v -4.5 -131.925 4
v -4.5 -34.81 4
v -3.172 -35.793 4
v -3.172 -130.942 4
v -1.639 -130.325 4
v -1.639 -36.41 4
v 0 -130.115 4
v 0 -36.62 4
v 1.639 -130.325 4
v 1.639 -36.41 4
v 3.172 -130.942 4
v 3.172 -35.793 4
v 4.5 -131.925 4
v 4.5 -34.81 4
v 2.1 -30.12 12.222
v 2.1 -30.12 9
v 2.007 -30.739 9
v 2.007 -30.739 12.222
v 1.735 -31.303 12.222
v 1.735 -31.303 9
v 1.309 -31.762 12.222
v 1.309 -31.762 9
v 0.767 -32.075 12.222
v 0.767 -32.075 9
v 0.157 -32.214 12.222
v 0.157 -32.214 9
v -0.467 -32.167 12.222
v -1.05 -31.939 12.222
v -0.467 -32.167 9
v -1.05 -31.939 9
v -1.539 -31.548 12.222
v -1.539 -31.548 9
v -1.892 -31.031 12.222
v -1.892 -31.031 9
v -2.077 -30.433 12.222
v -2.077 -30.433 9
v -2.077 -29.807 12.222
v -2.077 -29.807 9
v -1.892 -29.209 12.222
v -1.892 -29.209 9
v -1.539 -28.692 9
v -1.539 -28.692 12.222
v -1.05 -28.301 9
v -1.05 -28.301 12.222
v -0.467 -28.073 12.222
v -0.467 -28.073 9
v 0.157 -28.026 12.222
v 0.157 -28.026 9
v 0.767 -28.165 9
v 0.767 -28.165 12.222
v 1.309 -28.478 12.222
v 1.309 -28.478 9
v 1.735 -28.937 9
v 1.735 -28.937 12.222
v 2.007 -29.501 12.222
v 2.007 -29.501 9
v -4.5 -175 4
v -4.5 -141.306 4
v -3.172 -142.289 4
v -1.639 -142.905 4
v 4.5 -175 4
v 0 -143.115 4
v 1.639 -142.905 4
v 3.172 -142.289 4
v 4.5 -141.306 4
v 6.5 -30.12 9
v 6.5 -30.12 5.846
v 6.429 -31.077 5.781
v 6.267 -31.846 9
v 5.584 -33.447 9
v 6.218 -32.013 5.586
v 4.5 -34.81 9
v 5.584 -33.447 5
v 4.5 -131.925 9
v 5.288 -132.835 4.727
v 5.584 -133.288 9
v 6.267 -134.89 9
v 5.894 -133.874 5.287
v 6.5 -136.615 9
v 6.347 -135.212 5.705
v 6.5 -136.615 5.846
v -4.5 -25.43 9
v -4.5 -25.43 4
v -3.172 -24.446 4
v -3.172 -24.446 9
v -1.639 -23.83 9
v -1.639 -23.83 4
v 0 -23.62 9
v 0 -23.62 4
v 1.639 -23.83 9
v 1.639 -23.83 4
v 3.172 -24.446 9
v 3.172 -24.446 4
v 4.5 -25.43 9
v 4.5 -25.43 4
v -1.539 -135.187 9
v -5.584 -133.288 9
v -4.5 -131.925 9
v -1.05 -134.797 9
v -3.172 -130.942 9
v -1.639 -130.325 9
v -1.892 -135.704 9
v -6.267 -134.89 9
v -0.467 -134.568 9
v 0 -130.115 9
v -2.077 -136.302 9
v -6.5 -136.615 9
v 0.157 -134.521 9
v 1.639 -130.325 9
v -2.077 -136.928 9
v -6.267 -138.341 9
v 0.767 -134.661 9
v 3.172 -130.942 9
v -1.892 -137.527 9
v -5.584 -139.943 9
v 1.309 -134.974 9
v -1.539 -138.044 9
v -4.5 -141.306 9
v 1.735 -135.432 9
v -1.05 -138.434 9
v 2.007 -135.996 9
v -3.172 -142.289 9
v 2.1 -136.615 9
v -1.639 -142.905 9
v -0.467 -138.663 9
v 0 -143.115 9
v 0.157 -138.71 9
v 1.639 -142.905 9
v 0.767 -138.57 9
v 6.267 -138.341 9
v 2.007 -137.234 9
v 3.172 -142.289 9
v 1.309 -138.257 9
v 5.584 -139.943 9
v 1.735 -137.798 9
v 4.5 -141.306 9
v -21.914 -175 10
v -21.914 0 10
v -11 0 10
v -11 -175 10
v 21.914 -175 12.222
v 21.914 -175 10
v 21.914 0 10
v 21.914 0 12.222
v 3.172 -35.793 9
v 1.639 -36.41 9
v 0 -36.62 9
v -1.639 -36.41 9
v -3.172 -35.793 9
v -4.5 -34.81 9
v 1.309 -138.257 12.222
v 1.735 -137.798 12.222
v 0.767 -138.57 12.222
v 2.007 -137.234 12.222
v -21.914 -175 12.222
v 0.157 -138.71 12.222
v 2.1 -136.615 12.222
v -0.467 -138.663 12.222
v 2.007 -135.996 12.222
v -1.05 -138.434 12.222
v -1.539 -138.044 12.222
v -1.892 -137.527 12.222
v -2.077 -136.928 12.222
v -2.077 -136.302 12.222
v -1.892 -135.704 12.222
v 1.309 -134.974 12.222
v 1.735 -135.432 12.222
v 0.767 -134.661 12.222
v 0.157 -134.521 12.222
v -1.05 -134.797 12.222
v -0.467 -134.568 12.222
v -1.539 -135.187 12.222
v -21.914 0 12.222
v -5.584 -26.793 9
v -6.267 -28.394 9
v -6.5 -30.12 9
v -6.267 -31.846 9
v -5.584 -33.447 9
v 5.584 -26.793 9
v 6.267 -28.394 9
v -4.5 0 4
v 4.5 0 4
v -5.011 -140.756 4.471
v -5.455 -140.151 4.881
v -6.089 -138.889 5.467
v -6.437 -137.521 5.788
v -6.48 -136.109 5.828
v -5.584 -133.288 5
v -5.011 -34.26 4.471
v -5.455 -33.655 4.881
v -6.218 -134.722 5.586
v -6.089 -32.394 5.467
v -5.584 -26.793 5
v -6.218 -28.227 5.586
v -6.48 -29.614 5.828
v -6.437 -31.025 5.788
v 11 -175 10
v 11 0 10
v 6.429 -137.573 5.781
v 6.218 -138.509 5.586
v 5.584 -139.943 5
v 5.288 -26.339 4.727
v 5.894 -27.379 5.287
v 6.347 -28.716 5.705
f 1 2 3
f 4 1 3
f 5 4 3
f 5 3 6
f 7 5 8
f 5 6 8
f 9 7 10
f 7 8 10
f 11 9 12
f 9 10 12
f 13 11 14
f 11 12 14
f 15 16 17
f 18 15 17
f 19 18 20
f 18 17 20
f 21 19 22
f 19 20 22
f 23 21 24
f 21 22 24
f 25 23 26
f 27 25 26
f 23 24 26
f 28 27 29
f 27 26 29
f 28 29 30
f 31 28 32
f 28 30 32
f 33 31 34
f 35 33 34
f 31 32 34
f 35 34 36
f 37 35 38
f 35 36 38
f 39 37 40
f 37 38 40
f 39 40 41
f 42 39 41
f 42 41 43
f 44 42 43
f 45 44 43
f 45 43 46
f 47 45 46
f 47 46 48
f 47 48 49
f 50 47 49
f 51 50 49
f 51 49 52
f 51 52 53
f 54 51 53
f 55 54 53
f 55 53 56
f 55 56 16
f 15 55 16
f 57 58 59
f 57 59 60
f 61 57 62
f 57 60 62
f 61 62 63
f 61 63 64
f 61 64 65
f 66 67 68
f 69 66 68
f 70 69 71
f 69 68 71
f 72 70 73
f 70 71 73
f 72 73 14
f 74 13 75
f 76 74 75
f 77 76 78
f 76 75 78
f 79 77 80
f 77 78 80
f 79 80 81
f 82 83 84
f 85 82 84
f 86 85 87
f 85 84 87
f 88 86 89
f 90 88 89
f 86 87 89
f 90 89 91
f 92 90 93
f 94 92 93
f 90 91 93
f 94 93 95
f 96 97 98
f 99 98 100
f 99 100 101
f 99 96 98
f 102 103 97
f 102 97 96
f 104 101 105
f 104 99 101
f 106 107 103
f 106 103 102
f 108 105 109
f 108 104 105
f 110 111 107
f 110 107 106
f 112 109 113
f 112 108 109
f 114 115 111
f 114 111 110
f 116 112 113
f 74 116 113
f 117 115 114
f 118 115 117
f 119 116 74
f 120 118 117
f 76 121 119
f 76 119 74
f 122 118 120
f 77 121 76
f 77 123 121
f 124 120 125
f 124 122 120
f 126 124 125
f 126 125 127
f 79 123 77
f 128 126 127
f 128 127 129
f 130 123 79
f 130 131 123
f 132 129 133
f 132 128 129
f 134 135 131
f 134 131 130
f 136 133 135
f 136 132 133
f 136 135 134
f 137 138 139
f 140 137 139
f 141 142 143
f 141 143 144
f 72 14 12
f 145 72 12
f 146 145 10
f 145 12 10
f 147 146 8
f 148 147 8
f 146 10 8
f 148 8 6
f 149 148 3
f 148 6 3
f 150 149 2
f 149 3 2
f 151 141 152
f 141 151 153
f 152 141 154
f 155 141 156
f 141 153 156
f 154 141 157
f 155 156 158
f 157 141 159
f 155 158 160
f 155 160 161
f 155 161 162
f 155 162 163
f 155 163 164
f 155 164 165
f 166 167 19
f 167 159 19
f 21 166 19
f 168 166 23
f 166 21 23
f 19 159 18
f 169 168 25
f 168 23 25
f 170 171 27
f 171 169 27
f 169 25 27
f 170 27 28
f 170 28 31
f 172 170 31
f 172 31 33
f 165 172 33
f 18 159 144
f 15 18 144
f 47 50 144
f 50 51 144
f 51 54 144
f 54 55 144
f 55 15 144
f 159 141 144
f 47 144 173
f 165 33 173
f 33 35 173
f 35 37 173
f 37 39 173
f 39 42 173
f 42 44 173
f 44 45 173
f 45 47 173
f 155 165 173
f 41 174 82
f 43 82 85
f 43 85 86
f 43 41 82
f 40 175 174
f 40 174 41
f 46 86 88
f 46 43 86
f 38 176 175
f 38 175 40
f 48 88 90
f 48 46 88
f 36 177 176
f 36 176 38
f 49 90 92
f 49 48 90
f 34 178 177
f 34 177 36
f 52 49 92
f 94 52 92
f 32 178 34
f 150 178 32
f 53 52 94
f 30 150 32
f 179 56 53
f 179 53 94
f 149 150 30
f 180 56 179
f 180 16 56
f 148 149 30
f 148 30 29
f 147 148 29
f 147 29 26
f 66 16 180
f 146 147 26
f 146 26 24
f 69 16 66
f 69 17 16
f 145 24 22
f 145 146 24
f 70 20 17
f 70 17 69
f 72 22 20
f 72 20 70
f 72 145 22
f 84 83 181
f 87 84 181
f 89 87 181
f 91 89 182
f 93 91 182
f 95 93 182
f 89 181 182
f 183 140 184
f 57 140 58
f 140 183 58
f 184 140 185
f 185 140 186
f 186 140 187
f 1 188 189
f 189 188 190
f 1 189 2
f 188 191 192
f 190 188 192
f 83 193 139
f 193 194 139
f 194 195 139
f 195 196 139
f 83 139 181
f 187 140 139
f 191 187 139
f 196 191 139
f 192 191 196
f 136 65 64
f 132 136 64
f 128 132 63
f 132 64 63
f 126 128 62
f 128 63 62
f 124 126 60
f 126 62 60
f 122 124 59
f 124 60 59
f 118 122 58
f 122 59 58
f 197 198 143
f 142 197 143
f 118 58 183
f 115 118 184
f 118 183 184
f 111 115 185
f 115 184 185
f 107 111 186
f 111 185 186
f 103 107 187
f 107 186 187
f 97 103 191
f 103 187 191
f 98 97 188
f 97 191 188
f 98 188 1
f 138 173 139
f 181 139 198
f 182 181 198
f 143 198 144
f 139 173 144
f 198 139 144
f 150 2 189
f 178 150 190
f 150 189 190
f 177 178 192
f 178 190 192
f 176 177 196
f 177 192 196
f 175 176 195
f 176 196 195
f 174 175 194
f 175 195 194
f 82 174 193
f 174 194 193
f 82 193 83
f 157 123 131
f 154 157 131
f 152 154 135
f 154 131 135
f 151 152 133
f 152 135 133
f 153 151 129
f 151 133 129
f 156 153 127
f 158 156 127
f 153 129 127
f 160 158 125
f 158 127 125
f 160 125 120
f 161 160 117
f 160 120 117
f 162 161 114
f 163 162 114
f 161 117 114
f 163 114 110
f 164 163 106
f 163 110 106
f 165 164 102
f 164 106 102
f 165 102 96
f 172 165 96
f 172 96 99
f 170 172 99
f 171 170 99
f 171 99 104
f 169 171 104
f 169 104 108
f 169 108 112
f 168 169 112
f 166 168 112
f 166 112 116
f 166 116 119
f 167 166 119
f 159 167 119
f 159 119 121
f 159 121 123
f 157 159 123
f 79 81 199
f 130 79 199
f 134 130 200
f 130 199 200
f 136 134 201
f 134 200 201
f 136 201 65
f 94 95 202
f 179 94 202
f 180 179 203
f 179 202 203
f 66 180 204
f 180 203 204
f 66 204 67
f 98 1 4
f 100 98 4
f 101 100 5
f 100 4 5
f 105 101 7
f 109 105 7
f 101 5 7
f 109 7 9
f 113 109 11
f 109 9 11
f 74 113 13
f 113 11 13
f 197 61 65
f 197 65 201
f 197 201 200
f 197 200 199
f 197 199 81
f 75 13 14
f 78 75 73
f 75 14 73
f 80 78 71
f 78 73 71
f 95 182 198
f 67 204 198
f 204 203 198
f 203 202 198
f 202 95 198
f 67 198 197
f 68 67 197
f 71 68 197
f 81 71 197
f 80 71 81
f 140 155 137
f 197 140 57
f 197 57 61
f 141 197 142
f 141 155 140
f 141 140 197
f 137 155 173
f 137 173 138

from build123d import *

# Parameters (mm, degrees)
F1_DEPTH = 175
F2_R     = 2.1
F3_DEPTH = 25
F4_DEPTH = 25
F5_DEPTH = 5
F6_DEPTH = 5


with BuildPart() as f1:
    # F0 (on Front) → F1 (new body)
    with BuildSketch(Plane.XZ):
        Polygon((4.5, 4), (11, 10), (-11, 10), (-4.5, 4), (0, 4), align=None)
        Polygon((11, 10), (21.9141976312, 10), (21.9141976312, 12.2224409133), (-21.9141976312, 12.2224409133), (-21.9141976312, 10), (-11, 10), align=None)
    extrude(amount=F1_DEPTH)

    # F2 (on face) → F3 (cut)
    with BuildSketch(Plane(origin=(0, 0, 4), x_dir=(1, 0, 0), z_dir=(0, 0, -1))):
        with Locations((0, 136.6154402494)):
            Circle(F2_R)
    extrude(amount=-F3_DEPTH, mode=Mode.SUBTRACT)

    # F2 (on face) → F4 (cut)
    with BuildSketch(Plane(origin=(0, 0, 4), x_dir=(1, 0, 0), z_dir=(0, 0, -1))):
        with Locations((0, 30.1199369133)):
            Circle(F2_R)
    extrude(amount=-F4_DEPTH, mode=Mode.SUBTRACT)

    # F2 (on face) → F5 (cut)
    with BuildSketch(Plane(origin=(0, 0, 4), x_dir=(1, 0, 0), z_dir=(0, 0, -1))):
        with BuildLine():
            ThreePointArc((4.5, 25.4295211534), (5.9791303716, 27.5704271565), (6.5, 30.1199369133))
            ThreePointArc((6.5, 30.1199369133), (5.9791303716, 32.66944667), (4.5, 34.8103526731))
            Line((4.5, 34.8103526731), (4.5, 25.4295211534))
        make_face()
        with BuildLine():
            Line((4.5, 25.4295211534), (4.5, 34.8103526731))
            ThreePointArc((4.5, 34.8103526731), (0, 36.6199369133), (-4.5, 34.8103526731))
            Line((-4.5, 34.8103526731), (-4.5, 25.4295211534))
            ThreePointArc((-4.5, 25.4295211534), (0, 23.6199369133), (4.5, 25.4295211534))
        make_face()
        with Locations((0, 30.1199369133)):
            Circle(F2_R, mode=Mode.SUBTRACT)
        with BuildLine():
            Line((-4.5, 25.4295211534), (-4.5, 34.8103526731))
            ThreePointArc((-4.5, 34.8103526731), (-6.5, 30.1199369133), (-4.5, 25.4295211534))
        make_face()
        with BuildLine():
            Line((4.5, 141.3058560093), (4.5, 131.9250244896))
            ThreePointArc((4.5, 131.9250244896), (5.9791303716, 134.0659304926), (6.5, 136.6154402494))
            ThreePointArc((6.5, 136.6154402494), (5.9791303716, 139.1649500062), (4.5, 141.3058560093))
        make_face()
    extrude(amount=-F5_DEPTH, mode=Mode.SUBTRACT)

    # F2 (on face) → F6 (cut)
    with BuildSketch(Plane(origin=(0, 0, 4), x_dir=(1, 0, 0), z_dir=(0, 0, -1))):
        with BuildLine():
            ThreePointArc((-4.5, 141.3058560093), (-6.5, 136.6154402494), (-4.5, 131.9250244896))
            Line((-4.5, 131.9250244896), (-4.5, 141.3058560093))
        make_face()
        with BuildLine():
            ThreePointArc((-4.5, 131.9250244896), (0, 130.1154402494), (4.5, 131.9250244896))
            Line((4.5, 131.9250244896), (4.5, 141.3058560093))
            ThreePointArc((4.5, 141.3058560093), (0, 143.1154402494), (-4.5, 141.3058560093))
            Line((-4.5, 141.3058560093), (-4.5, 131.9250244896))
        make_face()
        with Locations((0, 136.6154402494)):
            Circle(F2_R, mode=Mode.SUBTRACT)
    extrude(amount=-F6_DEPTH, mode=Mode.SUBTRACT)


solid = f1.part
